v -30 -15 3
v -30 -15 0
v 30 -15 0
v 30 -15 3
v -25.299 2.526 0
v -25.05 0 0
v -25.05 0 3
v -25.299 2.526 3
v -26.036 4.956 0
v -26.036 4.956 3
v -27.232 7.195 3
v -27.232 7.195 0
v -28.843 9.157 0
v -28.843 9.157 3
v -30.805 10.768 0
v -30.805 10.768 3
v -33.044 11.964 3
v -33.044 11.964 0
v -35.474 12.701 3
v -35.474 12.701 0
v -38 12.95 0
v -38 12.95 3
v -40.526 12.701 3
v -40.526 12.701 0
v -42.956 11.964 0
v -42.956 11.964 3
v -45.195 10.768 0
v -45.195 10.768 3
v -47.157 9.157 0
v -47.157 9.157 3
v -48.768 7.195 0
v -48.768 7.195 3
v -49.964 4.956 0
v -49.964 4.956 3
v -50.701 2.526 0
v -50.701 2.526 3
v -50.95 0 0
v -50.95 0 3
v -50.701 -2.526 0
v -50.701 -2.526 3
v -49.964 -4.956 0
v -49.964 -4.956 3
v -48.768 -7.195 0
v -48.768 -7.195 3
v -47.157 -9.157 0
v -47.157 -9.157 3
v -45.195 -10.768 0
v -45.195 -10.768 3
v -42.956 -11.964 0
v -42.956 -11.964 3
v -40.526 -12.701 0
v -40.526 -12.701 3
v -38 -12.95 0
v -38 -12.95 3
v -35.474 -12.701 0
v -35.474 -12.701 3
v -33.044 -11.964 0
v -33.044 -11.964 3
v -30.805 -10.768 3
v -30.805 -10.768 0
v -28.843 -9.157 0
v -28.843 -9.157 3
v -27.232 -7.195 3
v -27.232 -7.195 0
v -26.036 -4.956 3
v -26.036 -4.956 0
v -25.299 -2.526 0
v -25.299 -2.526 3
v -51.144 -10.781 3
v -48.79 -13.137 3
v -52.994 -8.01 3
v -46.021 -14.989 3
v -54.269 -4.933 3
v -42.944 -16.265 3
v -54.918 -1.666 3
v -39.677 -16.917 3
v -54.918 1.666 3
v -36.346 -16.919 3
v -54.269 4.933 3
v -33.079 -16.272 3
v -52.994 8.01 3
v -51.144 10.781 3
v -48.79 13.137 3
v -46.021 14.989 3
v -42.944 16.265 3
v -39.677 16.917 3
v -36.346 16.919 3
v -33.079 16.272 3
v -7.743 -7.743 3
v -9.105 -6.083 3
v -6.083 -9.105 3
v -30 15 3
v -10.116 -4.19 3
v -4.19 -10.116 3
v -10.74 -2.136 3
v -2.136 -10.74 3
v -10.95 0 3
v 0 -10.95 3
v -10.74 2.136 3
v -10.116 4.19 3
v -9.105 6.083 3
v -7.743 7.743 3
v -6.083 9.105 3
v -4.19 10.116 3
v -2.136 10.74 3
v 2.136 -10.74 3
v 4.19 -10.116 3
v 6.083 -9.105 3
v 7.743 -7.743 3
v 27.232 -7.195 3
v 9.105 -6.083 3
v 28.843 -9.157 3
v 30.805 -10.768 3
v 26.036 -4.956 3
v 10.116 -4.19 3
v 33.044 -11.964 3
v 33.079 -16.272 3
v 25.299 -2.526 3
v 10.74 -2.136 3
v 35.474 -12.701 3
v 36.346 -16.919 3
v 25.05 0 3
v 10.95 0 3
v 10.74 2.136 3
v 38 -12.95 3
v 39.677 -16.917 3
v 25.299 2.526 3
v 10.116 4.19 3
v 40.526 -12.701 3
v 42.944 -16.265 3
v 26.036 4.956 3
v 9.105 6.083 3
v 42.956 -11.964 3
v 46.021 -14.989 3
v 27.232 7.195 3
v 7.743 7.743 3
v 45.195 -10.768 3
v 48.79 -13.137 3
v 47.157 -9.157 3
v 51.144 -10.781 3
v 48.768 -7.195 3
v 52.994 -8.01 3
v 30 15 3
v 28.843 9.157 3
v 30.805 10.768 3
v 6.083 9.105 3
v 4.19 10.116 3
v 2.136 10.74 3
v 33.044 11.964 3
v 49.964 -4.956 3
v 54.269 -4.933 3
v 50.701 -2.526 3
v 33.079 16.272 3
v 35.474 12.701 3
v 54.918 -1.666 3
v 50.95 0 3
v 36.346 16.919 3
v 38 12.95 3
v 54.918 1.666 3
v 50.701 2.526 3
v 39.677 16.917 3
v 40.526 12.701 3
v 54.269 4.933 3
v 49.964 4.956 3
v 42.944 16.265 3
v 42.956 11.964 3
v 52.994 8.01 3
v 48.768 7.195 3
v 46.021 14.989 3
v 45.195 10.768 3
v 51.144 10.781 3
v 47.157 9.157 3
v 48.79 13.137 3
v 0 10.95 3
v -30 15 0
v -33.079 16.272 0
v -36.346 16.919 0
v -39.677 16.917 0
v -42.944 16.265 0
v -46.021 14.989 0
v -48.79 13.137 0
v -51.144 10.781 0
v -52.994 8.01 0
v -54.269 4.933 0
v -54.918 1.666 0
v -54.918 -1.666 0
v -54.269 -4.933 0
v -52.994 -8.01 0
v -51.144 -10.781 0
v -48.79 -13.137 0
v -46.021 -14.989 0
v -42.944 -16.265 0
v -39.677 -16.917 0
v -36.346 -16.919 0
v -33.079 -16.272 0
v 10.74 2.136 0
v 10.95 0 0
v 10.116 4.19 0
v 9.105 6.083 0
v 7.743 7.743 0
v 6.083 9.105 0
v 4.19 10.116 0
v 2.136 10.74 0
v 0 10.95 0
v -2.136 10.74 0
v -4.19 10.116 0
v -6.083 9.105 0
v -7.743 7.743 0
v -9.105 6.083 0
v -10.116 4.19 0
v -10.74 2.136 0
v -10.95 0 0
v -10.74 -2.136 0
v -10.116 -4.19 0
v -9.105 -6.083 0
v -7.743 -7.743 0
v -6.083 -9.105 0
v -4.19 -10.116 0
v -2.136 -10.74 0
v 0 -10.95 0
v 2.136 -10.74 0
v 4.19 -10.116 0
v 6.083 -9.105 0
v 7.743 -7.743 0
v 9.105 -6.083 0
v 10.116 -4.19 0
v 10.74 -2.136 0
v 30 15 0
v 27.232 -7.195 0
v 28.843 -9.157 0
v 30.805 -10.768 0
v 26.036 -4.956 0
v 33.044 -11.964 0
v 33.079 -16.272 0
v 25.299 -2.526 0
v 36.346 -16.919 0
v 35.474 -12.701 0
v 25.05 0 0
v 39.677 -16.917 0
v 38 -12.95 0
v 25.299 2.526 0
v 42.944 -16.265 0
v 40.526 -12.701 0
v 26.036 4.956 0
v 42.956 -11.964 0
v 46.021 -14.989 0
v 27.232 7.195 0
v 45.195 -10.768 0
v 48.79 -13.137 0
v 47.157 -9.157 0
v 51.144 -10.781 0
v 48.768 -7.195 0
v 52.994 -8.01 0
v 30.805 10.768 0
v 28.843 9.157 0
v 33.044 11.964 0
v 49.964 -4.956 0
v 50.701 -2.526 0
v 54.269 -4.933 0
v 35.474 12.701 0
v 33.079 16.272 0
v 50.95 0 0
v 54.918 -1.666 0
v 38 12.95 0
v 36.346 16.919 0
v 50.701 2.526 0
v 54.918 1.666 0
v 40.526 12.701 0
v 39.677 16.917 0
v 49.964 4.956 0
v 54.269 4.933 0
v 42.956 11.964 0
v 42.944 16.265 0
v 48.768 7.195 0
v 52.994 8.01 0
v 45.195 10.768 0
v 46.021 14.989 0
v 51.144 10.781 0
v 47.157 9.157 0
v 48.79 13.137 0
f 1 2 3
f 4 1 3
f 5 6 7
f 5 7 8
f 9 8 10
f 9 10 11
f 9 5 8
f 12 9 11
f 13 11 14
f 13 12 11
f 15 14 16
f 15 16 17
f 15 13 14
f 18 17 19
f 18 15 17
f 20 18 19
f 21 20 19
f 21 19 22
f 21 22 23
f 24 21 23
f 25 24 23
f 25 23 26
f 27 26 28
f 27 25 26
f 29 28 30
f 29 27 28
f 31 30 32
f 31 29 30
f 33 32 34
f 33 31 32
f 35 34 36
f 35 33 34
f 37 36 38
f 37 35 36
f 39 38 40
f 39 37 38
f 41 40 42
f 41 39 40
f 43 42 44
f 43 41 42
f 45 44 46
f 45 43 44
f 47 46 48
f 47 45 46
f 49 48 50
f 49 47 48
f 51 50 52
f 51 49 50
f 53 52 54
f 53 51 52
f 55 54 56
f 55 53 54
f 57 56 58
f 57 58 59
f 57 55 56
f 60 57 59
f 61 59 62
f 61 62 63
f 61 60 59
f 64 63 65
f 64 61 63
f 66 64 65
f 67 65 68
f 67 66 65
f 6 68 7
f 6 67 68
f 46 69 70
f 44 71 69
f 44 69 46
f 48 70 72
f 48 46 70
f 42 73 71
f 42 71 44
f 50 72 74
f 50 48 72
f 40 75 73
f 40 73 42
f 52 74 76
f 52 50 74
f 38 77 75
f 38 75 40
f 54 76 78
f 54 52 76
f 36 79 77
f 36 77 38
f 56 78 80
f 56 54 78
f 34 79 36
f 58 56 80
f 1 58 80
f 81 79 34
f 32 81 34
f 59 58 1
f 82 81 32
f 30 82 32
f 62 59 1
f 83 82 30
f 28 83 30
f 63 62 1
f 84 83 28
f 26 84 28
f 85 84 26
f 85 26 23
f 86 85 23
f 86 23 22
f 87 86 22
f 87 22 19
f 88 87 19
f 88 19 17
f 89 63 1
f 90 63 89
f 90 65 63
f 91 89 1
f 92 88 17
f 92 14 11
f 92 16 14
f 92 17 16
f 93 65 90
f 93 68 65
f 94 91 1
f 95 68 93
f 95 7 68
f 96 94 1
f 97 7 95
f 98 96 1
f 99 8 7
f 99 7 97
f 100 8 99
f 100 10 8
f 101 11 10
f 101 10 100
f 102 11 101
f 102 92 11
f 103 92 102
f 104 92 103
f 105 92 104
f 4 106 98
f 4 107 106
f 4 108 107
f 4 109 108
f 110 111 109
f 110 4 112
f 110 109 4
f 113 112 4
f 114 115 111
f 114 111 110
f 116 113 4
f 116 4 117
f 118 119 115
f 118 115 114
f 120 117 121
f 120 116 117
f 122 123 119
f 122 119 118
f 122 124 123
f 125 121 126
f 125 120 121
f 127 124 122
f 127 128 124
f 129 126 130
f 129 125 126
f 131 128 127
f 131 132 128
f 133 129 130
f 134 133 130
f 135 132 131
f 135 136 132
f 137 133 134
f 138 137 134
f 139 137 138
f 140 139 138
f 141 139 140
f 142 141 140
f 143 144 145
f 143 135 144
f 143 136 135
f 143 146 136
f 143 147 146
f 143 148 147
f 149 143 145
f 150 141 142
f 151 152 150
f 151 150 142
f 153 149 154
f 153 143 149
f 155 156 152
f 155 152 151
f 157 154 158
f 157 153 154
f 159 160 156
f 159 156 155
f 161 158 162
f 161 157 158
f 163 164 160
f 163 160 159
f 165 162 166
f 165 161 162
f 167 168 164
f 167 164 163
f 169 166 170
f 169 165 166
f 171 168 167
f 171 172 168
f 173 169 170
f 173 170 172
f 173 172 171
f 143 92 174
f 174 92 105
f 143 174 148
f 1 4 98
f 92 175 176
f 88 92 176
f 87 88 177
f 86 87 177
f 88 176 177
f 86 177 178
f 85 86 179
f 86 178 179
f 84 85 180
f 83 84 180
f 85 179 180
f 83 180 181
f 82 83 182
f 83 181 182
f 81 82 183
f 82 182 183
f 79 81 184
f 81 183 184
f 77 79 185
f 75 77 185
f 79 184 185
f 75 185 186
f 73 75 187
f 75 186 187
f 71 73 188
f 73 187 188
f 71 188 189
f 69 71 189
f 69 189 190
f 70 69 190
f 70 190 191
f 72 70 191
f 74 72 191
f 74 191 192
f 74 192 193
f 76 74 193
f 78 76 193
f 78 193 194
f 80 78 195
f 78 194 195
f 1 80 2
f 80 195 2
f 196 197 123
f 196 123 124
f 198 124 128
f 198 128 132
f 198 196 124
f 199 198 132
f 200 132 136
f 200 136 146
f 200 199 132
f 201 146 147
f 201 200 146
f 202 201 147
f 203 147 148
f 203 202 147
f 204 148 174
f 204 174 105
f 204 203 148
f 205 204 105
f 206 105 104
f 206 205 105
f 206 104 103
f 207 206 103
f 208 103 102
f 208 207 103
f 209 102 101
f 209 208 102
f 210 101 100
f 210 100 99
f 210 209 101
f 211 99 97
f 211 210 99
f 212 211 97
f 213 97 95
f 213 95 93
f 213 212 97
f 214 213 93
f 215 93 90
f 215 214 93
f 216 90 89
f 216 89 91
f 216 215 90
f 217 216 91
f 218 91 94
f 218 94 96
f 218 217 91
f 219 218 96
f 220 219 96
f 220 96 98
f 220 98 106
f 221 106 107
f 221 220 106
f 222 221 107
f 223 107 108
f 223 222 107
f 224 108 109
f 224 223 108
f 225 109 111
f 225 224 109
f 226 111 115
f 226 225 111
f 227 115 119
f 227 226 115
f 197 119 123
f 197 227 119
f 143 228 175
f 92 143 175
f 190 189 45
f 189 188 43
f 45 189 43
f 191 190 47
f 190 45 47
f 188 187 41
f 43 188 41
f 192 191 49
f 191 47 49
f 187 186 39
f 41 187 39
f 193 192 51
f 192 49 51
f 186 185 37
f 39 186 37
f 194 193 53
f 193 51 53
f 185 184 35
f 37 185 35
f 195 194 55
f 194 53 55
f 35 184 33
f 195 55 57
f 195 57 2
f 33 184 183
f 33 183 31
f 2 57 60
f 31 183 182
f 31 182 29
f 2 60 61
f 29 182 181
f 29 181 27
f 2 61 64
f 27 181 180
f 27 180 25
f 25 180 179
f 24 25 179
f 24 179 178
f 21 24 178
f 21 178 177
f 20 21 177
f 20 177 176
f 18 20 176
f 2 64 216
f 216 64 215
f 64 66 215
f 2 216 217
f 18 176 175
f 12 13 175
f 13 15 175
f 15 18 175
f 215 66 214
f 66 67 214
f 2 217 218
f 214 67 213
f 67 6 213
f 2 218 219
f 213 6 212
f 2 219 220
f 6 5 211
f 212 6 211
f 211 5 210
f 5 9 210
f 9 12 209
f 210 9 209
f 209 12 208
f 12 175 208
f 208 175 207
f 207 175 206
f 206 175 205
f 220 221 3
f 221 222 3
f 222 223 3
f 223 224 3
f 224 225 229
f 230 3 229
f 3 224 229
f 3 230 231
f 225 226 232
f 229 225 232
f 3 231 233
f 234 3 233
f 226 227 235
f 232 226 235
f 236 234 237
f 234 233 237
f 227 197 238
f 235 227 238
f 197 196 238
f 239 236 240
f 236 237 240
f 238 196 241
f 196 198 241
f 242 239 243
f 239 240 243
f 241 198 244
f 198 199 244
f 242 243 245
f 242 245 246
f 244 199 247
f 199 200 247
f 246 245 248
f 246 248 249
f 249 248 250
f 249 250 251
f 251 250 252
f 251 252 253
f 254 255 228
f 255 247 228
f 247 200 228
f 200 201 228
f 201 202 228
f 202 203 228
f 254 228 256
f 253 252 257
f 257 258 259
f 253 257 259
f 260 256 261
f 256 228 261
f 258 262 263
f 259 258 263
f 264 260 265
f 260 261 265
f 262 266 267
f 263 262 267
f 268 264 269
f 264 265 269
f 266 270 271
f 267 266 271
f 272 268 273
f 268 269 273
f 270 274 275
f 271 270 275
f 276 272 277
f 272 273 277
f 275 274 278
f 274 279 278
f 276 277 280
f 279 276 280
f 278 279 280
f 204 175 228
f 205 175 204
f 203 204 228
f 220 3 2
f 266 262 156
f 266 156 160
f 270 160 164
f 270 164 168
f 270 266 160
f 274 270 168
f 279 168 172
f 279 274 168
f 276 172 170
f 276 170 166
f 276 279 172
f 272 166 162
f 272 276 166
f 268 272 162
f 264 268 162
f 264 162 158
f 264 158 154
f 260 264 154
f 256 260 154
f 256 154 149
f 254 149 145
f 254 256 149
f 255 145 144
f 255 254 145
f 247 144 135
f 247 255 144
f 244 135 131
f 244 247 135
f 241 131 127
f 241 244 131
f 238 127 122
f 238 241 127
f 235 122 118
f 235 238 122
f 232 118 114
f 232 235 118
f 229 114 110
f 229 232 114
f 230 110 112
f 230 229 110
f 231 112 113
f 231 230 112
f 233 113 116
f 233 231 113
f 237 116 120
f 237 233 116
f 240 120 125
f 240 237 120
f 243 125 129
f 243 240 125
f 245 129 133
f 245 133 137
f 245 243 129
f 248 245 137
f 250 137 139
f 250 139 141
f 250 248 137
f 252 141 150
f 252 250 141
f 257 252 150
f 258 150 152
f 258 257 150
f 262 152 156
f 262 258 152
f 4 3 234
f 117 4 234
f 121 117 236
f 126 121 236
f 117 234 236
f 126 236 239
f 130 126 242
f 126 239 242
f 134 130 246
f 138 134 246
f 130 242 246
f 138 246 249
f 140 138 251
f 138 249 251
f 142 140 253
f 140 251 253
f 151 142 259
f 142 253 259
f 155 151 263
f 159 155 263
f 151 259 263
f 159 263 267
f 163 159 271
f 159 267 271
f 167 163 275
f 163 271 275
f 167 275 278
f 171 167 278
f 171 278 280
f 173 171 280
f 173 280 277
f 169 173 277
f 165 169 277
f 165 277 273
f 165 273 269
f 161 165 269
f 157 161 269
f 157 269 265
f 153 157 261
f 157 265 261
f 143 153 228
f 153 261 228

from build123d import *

# Parameters (mm, degrees)
F0_R     = 12.95
F0_R_2   = 10.95
F1_DEPTH = 3


with BuildPart() as f1:
    # F0 (on Top) → F1 (new body)
    with BuildSketch(Plane.XY):
        with BuildLine():
            Line((30, 15), (-30, 15))
            ThreePointArc((-30, 15), (-55, 0), (-30, -15))
            Line((-30, -15), (0, -15))
            Line((0, -15), (30, -15))
            ThreePointArc((30, -15), (55, 0), (30, 15))
        make_face()
        with Locations((-38, 0)):
            Circle(F0_R, mode=Mode.SUBTRACT)
        Circle(F0_R_2, mode=Mode.SUBTRACT)
        with Locations((38, 0)):
            Circle(F0_R, mode=Mode.SUBTRACT)
    extrude(amount=F1_DEPTH)


solid = f1.part
